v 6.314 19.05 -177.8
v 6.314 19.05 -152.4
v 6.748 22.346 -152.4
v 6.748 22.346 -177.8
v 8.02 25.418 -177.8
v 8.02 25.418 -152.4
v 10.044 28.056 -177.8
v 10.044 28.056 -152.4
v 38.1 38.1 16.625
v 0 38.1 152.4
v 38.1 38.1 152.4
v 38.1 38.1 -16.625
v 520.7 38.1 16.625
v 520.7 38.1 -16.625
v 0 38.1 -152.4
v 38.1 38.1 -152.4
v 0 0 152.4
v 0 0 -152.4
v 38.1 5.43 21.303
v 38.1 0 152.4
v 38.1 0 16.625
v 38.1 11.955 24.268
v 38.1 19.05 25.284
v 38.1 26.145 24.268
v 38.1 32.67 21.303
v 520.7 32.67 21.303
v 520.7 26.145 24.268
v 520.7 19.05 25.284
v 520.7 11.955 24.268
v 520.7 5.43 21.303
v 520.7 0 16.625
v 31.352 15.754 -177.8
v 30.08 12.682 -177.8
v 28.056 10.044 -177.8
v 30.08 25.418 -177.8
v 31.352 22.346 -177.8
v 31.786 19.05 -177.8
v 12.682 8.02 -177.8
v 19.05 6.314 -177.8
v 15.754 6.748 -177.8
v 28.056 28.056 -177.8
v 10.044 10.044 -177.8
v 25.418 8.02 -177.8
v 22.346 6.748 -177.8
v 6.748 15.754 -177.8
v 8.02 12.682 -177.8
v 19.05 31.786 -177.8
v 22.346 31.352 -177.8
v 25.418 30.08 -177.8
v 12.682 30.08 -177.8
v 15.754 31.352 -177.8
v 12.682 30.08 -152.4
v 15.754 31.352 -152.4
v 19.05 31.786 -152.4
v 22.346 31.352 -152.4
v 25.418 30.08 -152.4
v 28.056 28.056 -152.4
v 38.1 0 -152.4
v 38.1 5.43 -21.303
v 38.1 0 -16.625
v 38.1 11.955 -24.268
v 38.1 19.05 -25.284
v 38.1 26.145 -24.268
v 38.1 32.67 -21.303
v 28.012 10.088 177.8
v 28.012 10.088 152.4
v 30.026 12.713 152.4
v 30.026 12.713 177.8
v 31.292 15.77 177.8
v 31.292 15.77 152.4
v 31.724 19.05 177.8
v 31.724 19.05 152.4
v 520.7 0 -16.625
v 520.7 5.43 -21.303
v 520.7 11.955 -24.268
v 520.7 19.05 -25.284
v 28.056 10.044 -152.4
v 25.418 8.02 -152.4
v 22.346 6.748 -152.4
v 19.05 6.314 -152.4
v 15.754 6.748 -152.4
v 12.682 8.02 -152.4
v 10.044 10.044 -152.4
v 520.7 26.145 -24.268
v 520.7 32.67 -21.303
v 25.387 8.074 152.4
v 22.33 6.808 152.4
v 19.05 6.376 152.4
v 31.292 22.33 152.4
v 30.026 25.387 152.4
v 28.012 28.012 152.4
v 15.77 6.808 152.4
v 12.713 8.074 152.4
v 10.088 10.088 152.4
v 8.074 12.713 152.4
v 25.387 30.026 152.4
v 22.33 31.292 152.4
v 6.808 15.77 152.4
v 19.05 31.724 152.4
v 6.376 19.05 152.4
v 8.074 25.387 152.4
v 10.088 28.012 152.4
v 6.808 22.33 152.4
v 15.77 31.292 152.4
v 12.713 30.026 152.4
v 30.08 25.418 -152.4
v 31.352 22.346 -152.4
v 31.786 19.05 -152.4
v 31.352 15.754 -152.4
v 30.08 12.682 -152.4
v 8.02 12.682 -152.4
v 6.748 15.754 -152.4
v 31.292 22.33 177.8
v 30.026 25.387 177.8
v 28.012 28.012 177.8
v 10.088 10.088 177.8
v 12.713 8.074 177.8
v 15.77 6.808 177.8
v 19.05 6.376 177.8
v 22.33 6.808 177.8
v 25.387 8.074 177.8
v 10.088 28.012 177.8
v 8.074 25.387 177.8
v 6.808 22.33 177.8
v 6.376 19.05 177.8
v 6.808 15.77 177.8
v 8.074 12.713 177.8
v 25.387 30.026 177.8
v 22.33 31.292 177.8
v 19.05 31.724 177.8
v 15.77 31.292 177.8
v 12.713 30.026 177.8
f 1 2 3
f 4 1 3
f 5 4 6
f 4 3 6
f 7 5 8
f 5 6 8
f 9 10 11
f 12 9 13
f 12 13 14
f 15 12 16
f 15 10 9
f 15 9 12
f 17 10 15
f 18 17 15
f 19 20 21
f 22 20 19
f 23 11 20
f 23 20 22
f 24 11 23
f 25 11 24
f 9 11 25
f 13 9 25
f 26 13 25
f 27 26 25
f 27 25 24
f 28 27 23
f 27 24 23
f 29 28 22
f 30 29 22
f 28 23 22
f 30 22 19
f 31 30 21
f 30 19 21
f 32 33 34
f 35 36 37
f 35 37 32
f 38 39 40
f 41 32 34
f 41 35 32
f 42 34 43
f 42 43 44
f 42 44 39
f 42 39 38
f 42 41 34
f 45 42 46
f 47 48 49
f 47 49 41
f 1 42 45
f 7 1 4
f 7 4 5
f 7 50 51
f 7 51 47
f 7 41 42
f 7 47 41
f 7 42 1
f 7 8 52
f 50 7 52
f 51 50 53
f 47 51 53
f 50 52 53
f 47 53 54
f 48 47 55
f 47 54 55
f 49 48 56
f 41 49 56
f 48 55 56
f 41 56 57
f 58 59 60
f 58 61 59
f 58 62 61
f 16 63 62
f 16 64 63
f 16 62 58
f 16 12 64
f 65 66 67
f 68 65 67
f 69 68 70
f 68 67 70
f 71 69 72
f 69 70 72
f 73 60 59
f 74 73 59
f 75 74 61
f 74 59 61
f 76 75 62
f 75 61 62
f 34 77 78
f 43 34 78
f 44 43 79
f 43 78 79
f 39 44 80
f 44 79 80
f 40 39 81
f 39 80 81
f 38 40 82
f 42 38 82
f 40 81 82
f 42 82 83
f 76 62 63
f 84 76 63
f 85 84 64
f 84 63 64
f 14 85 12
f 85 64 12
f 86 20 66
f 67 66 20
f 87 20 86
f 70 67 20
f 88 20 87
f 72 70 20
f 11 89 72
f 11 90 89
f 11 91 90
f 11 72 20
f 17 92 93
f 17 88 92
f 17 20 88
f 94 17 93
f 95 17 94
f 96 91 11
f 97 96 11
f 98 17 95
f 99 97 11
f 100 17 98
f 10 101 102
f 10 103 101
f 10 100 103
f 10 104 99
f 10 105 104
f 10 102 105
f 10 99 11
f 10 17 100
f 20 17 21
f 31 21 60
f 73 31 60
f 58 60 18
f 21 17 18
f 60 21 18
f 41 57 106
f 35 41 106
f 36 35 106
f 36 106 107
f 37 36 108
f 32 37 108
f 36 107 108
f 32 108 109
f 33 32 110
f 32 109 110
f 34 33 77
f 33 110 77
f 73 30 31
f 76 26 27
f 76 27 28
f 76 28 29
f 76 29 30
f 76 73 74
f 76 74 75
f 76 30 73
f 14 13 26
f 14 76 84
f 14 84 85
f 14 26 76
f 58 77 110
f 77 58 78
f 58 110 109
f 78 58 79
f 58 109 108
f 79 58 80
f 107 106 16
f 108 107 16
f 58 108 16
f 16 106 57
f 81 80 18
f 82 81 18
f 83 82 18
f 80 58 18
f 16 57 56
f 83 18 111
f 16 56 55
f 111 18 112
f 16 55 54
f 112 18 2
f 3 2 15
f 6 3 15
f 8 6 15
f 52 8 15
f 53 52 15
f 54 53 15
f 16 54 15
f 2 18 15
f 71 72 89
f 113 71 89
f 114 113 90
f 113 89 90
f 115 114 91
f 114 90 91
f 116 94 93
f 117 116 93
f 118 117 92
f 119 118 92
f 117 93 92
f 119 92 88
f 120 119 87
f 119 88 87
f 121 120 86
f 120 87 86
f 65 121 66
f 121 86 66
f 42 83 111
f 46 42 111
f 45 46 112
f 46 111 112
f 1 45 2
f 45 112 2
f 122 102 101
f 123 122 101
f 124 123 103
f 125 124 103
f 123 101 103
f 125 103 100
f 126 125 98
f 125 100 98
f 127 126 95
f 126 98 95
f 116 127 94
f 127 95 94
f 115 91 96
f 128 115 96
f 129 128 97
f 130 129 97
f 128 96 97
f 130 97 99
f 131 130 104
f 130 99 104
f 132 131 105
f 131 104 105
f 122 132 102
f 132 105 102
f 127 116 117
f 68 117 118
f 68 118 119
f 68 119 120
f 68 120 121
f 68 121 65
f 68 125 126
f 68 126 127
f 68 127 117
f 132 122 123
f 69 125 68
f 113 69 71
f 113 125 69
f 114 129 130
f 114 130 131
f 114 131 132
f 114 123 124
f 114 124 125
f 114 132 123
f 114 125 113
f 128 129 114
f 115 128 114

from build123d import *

# Parameters (mm, degrees)
SKETCH1_W           = 304.8
SKETCH1_H           = 38.1
BOSS_EXTRUDE5_DEPTH = 38.1
BOSS_EXTRUDE6_DEPTH = 25.4
BOSS_EXTRUDE7_DEPTH = 25.4
BOSS_EXTRUDE8_DEPTH = 482.6


with BuildPart() as part:
    # Sketch1 → Boss-Extrude5 (new body)
    with BuildSketch(Plane(origin=(0, 0, 0), x_dir=(0, 0, -1), z_dir=(1, 0, 0))):
        with Locations((0, 19.05)):
            Rectangle(SKETCH1_W, SKETCH1_H)
    extrude(amount=BOSS_EXTRUDE5_DEPTH)

    # Sketch7 → Boss-Extrude6 (add)
    with BuildSketch(Plane.XY.offset(152.4)):
        with BuildLine():
            ThreePointArc((28.011830747, 28.011830747), (19.05, 31.723942586), (10.088169253, 28.011830747))
            Line((10.088169253, 28.011830747), (19.05, 19.05))
            Line((19.05, 19.05), (28.011830747, 28.011830747))
        make_face()
        with BuildLine():
            Line((19.05, 19.05), (10.088169253, 28.011830747))
            ThreePointArc((10.088169253, 28.011830747), (6.376057414, 19.05), (10.088169253, 10.088169253))
            Line((10.088169253, 10.088169253), (19.05, 19.05))
        make_face()
        with BuildLine():
            Line((28.011830747, 28.011830747), (19.05, 19.05))
            Line((19.05, 19.05), (28.011830747, 10.088169253))
            ThreePointArc((28.011830747, 10.088169253), (30.759196151, 14.19989215), (31.723942586, 19.05))
            ThreePointArc((31.723942586, 19.05), (30.759196151, 23.90010785), (28.011830747, 28.011830747))
        make_face()
        with BuildLine():
            Line((28.011830747, 10.088169253), (19.05, 19.05))
            Line((19.05, 19.05), (10.088169253, 10.088169253))
            ThreePointArc((10.088169253, 10.088169253), (19.05, 6.376057414), (28.011830747, 10.088169253))
        make_face()
    extrude(amount=BOSS_EXTRUDE6_DEPTH)

    # Sketch8 → Boss-Extrude7 (add)
    with BuildSketch(Plane(origin=(0, 0, -152.4), x_dir=(-1, 0, 0), z_dir=(0, 0, -1))):
        with BuildLine():
            ThreePointArc((-10.044344025, 28.055655975), (-19.05, 31.785920818), (-28.055655975, 28.055655975))
            Line((-28.055655975, 28.055655975), (-19.05, 19.05))
            Line((-19.05, 19.05), (-10.044344025, 28.055655975))
        make_face()
        with BuildLine():
            Line((-19.05, 19.05), (-28.055655975, 28.055655975))
            ThreePointArc((-28.055655975, 28.055655975), (-31.785920818, 19.05), (-28.055655975, 10.044344025))
            Line((-28.055655975, 10.044344025), (-19.05, 19.05))
        make_face()
        with BuildLine():
            Line((-10.044344025, 28.055655975), (-19.05, 19.05))
            Line((-19.05, 19.05), (-10.044344025, 10.044344025))
            ThreePointArc((-10.044344025, 10.044344025), (-7.283543428, 14.176174107), (-6.314079182, 19.05))
            ThreePointArc((-6.314079182, 19.05), (-7.283543428, 23.923825893), (-10.044344025, 28.055655975))
        make_face()
        with BuildLine():
            Line((-10.044344025, 10.044344025), (-19.05, 19.05))
            Line((-19.05, 19.05), (-28.055655975, 10.044344025))
            ThreePointArc((-28.055655975, 10.044344025), (-19.05, 6.314079182), (-10.044344025, 10.044344025))
        make_face()
    extrude(amount=BOSS_EXTRUDE7_DEPTH)

    # Sketch9 → Boss-Extrude8 (add)
    with BuildSketch(Plane(origin=(38.1, 0, 0), x_dir=(0, 0, -1), z_dir=(1, 0, 0))):
        with BuildLine():
            Line((-16.624944564, 0), (0, 0))
            Line((0, 0), (0, 38.1))
            Line((0, 38.1), (-16.624944564, 38.1))
            ThreePointArc((-16.624944564, 38.1), (-25.284210127, 19.05), (-16.624944564, 0))
        make_face()
        with BuildLine():
            Line((0, 38.1), (0, 0))
            Line((0, 0), (16.624944564, 0))
            ThreePointArc((16.624944564, 0), (23.01781781, 8.587144509), (25.284210127, 19.05))
            ThreePointArc((25.284210127, 19.05), (23.01781781, 29.512855491), (16.624944564, 38.1))
            Line((16.624944564, 38.1), (0, 38.1))
        make_face()
    extrude(amount=BOSS_EXTRUDE8_DEPTH)


solid = part.part
